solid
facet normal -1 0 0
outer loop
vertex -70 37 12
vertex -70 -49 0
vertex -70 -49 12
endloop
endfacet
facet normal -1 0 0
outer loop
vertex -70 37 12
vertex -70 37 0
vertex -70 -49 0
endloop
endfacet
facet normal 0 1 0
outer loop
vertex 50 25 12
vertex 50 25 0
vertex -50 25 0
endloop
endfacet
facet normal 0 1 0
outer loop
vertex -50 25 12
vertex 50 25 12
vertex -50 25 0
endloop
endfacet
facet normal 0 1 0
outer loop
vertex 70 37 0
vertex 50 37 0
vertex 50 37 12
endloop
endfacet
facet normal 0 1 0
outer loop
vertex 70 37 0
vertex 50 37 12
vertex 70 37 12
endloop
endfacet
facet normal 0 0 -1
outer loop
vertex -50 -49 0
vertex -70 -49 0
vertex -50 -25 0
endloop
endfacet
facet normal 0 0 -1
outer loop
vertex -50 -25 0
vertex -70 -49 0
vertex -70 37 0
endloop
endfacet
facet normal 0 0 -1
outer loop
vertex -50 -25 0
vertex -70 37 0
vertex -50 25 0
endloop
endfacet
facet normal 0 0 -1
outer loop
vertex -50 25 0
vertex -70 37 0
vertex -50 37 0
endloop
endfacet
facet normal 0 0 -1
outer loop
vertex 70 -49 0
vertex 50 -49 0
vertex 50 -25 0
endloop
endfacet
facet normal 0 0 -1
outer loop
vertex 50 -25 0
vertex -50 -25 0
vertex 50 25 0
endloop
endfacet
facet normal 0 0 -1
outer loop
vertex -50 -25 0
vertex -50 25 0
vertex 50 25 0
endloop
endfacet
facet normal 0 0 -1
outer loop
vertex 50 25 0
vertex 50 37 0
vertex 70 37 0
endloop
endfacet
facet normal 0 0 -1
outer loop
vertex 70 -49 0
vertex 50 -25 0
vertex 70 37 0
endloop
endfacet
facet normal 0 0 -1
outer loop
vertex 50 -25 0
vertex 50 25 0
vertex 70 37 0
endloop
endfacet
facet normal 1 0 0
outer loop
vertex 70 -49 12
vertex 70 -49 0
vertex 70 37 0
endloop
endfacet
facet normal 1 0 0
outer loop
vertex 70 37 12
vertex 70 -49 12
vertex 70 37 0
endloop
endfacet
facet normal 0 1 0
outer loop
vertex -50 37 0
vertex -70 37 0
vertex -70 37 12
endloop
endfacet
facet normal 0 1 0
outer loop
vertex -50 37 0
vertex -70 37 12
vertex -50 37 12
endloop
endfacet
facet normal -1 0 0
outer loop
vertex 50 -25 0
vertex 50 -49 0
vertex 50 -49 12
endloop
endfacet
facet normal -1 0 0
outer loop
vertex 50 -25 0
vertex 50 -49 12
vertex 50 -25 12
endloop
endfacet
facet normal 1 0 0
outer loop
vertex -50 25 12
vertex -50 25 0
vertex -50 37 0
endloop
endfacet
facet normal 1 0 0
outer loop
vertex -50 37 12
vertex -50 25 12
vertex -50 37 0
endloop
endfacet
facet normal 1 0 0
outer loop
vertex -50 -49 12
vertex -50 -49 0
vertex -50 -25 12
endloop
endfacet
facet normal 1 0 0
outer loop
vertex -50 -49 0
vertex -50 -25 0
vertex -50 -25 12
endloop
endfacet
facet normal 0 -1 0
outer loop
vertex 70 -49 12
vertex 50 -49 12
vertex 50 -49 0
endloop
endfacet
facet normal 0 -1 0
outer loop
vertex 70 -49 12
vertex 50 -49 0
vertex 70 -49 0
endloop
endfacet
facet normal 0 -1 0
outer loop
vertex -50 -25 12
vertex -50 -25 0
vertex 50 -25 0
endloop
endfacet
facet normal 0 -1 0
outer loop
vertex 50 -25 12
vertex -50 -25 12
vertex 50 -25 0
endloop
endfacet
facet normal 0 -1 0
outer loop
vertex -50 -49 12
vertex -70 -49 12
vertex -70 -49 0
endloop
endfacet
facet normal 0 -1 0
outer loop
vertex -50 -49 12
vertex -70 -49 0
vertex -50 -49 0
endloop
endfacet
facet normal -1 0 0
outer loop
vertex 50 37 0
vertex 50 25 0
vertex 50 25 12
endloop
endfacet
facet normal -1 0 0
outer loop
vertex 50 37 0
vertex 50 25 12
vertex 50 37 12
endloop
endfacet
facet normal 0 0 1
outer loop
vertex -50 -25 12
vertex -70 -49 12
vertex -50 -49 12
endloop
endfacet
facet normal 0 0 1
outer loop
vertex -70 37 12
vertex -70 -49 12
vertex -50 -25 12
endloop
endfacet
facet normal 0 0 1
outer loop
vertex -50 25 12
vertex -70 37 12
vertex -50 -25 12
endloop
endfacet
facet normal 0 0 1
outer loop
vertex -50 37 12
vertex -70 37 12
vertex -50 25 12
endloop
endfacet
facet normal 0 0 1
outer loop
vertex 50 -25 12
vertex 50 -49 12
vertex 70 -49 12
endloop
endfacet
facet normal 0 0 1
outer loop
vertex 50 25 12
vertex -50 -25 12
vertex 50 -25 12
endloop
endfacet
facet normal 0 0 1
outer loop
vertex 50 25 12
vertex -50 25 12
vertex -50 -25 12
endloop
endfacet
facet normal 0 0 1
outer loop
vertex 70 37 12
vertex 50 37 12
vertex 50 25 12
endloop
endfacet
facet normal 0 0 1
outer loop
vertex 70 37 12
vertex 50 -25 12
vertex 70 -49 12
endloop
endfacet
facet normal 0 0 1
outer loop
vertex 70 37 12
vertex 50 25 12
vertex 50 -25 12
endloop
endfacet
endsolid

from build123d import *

# Parameters (mm, degrees)
F0_W      = 20
F0_H      = 12
F1_DEPTH  = 12
F1_FACE_W = 20
F1_FACE_H = 12
F2_DEPTH  = 12


with BuildPart() as f1:
    # F0 (on Top) → F1 (new body)
    with BuildSketch(Plane.XY):
        Polygon((70, -25), (70, 25), (50, 25), (-50, 25), (-70, 25), (-70, -25), (-50, -25), (50, -25), align=None)
        with Locations((60, 31)):
            Rectangle(F0_W, F0_H)
        with Locations((60, -31)):
            Rectangle(F0_W, F0_H)
        with Locations((-60, 31)):
            Rectangle(F0_W, F0_H)
        with Locations((-60, -31)):
            Rectangle(F0_W, F0_H)
    extrude(amount=F1_DEPTH)

    # F1_face (on face) → F2 (join)
    with BuildSketch(Plane(origin=(-60, -37, 6), x_dir=(1, 0, 0), z_dir=(0, -1, 0))):
        Rectangle(F1_FACE_W, F1_FACE_H)
        with Locations((120, 0)):
            Rectangle(F1_FACE_W, F1_FACE_H)
    extrude(amount=F2_DEPTH)


solid = f1.part
